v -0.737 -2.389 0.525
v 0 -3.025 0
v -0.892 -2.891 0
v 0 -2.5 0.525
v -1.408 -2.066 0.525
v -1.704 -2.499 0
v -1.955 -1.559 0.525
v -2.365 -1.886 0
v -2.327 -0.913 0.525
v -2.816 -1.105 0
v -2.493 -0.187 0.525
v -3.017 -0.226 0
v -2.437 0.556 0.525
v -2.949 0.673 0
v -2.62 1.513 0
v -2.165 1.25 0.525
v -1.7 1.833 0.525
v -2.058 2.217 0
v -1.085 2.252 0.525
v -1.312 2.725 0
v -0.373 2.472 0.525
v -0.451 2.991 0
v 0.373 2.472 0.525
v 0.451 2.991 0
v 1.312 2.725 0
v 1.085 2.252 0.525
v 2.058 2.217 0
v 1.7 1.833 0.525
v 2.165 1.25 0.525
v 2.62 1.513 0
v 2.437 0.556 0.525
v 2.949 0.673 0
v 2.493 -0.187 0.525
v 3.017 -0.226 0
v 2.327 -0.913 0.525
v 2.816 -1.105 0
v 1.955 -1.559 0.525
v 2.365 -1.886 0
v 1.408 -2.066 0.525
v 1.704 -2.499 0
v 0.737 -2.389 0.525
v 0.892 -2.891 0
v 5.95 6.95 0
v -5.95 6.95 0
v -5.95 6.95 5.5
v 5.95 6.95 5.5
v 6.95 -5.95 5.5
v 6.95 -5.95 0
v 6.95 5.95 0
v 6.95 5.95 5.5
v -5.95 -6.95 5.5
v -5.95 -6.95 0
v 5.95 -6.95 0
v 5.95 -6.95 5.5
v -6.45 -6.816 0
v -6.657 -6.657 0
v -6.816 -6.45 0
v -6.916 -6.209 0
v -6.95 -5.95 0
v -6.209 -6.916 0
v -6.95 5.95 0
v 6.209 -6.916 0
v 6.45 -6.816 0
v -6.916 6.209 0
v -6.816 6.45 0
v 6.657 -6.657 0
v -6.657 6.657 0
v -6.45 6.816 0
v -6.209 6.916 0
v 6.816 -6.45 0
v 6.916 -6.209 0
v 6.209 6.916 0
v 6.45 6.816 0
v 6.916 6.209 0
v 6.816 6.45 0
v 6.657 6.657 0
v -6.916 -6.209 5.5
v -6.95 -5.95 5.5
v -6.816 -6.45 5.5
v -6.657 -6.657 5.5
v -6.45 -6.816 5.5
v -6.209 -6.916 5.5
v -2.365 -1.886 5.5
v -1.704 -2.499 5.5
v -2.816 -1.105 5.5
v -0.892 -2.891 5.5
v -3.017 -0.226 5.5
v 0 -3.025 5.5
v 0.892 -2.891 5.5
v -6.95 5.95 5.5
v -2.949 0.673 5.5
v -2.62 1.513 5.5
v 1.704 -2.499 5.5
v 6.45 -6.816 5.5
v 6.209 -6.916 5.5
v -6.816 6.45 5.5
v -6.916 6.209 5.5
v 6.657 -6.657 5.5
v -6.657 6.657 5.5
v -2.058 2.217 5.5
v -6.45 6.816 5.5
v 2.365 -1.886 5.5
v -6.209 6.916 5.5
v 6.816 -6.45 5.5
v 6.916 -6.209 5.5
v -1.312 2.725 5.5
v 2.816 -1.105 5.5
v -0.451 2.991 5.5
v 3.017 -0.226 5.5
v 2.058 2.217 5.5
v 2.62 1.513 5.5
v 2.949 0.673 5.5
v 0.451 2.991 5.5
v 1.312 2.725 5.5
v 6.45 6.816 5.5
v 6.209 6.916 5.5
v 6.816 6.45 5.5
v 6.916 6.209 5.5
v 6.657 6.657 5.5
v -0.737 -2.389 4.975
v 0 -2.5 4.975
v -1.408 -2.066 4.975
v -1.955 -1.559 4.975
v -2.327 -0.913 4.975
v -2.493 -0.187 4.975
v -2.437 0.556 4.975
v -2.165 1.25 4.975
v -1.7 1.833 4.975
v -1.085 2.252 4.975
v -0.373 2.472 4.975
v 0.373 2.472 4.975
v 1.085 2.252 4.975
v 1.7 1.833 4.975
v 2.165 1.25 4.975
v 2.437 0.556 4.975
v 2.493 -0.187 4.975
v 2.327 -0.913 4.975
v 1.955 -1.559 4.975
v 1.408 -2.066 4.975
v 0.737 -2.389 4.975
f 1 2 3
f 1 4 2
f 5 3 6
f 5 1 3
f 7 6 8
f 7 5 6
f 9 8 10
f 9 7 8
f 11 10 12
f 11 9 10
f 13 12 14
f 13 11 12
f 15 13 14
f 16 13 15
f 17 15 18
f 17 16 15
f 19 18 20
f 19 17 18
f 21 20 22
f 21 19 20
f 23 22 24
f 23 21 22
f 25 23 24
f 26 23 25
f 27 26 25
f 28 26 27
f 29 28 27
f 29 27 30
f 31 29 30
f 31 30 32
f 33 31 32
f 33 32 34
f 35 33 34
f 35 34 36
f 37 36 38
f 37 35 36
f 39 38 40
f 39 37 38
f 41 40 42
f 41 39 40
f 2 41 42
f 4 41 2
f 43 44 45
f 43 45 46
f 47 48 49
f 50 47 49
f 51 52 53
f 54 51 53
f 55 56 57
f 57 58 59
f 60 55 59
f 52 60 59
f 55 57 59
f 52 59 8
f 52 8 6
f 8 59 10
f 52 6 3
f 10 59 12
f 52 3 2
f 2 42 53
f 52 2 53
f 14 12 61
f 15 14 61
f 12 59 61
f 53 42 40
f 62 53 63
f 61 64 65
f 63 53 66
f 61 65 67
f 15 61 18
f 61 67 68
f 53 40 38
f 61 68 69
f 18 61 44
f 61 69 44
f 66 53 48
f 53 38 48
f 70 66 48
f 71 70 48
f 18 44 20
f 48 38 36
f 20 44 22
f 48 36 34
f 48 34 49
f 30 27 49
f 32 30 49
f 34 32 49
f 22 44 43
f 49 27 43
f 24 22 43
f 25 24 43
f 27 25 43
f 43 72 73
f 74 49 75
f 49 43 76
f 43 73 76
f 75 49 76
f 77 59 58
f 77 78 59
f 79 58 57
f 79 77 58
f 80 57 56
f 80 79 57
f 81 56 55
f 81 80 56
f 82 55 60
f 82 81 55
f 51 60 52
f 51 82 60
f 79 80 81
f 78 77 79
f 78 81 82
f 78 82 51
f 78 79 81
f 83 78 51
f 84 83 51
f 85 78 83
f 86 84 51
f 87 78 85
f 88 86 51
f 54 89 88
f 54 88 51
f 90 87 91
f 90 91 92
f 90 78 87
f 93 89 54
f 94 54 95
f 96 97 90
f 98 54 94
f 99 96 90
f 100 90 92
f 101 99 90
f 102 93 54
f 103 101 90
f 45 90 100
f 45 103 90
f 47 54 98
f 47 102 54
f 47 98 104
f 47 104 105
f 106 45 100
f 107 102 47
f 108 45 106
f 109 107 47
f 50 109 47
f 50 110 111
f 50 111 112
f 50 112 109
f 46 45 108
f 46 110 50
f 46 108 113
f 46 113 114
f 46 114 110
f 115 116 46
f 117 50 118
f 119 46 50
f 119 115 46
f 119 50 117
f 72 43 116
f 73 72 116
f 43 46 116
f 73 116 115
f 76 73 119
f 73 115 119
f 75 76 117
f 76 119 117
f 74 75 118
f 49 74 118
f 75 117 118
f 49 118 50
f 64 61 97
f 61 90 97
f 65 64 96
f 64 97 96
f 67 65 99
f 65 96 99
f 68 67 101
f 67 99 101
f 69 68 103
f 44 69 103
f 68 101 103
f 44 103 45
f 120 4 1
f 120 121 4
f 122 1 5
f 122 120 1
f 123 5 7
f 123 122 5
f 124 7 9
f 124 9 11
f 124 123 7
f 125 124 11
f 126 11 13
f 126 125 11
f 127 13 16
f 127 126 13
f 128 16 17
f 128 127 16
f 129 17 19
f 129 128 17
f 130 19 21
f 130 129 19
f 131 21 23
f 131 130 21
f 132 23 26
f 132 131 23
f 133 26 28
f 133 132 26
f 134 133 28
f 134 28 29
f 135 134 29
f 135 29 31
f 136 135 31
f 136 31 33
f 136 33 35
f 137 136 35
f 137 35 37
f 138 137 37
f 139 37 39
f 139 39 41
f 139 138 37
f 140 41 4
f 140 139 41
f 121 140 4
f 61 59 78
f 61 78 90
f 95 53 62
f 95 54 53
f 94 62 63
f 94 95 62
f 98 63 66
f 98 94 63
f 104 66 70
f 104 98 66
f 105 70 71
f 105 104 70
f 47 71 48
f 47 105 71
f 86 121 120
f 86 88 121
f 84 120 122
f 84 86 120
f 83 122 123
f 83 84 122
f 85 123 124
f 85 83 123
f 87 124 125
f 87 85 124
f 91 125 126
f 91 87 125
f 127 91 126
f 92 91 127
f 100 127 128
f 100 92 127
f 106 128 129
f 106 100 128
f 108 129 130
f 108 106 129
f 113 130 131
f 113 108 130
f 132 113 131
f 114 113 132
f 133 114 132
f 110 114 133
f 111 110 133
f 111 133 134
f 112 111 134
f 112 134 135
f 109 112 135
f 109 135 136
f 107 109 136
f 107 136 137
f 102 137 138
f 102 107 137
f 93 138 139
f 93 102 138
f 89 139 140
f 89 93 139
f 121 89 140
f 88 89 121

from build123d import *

# Parameters (mm, degrees)
SKETCH_1_W      = 13.9
SKETCH_1_H      = 13.9
EXTRUDE_1_DEPTH = 5.5
FILLET_1_R      = 1


with BuildPart() as part:
    # Эскиз1 → Бобышка-Вытянуть1 (new body)
    with BuildSketch(Plane.XY):
        Rectangle(SKETCH_1_W, SKETCH_1_H)
    extrude(amount=EXTRUDE_1_DEPTH)

    # Эскиз3 → Отверстие обработанное метчиком M61 (revolve, cut)
    with BuildSketch(Plane(origin=(0, 0, 5.5), x_dir=(0, -1, 0), z_dir=(1, 0, 0))):
        Polygon((0, 0), (0, 5.5), (3.025, 5.5), (2.5, 4.975), (2.5, 0.525), (3.025, 0), align=None)
    revolve(axis=Axis((0, 0, 11.85), (0, 0, -1)), mode=Mode.SUBTRACT)

    # Скругление1
    fillet_1_edges = [part.edges().sort_by_distance(p)[0] for p in [
        (6.95, -6.95, 2.75),
        (-6.95, -6.95, 2.75),
        (-6.95, 6.95, 2.75),
        (6.95, 6.95, 2.75),
    ]]
    fillet(fillet_1_edges, radius=FILLET_1_R)


solid = part.part
